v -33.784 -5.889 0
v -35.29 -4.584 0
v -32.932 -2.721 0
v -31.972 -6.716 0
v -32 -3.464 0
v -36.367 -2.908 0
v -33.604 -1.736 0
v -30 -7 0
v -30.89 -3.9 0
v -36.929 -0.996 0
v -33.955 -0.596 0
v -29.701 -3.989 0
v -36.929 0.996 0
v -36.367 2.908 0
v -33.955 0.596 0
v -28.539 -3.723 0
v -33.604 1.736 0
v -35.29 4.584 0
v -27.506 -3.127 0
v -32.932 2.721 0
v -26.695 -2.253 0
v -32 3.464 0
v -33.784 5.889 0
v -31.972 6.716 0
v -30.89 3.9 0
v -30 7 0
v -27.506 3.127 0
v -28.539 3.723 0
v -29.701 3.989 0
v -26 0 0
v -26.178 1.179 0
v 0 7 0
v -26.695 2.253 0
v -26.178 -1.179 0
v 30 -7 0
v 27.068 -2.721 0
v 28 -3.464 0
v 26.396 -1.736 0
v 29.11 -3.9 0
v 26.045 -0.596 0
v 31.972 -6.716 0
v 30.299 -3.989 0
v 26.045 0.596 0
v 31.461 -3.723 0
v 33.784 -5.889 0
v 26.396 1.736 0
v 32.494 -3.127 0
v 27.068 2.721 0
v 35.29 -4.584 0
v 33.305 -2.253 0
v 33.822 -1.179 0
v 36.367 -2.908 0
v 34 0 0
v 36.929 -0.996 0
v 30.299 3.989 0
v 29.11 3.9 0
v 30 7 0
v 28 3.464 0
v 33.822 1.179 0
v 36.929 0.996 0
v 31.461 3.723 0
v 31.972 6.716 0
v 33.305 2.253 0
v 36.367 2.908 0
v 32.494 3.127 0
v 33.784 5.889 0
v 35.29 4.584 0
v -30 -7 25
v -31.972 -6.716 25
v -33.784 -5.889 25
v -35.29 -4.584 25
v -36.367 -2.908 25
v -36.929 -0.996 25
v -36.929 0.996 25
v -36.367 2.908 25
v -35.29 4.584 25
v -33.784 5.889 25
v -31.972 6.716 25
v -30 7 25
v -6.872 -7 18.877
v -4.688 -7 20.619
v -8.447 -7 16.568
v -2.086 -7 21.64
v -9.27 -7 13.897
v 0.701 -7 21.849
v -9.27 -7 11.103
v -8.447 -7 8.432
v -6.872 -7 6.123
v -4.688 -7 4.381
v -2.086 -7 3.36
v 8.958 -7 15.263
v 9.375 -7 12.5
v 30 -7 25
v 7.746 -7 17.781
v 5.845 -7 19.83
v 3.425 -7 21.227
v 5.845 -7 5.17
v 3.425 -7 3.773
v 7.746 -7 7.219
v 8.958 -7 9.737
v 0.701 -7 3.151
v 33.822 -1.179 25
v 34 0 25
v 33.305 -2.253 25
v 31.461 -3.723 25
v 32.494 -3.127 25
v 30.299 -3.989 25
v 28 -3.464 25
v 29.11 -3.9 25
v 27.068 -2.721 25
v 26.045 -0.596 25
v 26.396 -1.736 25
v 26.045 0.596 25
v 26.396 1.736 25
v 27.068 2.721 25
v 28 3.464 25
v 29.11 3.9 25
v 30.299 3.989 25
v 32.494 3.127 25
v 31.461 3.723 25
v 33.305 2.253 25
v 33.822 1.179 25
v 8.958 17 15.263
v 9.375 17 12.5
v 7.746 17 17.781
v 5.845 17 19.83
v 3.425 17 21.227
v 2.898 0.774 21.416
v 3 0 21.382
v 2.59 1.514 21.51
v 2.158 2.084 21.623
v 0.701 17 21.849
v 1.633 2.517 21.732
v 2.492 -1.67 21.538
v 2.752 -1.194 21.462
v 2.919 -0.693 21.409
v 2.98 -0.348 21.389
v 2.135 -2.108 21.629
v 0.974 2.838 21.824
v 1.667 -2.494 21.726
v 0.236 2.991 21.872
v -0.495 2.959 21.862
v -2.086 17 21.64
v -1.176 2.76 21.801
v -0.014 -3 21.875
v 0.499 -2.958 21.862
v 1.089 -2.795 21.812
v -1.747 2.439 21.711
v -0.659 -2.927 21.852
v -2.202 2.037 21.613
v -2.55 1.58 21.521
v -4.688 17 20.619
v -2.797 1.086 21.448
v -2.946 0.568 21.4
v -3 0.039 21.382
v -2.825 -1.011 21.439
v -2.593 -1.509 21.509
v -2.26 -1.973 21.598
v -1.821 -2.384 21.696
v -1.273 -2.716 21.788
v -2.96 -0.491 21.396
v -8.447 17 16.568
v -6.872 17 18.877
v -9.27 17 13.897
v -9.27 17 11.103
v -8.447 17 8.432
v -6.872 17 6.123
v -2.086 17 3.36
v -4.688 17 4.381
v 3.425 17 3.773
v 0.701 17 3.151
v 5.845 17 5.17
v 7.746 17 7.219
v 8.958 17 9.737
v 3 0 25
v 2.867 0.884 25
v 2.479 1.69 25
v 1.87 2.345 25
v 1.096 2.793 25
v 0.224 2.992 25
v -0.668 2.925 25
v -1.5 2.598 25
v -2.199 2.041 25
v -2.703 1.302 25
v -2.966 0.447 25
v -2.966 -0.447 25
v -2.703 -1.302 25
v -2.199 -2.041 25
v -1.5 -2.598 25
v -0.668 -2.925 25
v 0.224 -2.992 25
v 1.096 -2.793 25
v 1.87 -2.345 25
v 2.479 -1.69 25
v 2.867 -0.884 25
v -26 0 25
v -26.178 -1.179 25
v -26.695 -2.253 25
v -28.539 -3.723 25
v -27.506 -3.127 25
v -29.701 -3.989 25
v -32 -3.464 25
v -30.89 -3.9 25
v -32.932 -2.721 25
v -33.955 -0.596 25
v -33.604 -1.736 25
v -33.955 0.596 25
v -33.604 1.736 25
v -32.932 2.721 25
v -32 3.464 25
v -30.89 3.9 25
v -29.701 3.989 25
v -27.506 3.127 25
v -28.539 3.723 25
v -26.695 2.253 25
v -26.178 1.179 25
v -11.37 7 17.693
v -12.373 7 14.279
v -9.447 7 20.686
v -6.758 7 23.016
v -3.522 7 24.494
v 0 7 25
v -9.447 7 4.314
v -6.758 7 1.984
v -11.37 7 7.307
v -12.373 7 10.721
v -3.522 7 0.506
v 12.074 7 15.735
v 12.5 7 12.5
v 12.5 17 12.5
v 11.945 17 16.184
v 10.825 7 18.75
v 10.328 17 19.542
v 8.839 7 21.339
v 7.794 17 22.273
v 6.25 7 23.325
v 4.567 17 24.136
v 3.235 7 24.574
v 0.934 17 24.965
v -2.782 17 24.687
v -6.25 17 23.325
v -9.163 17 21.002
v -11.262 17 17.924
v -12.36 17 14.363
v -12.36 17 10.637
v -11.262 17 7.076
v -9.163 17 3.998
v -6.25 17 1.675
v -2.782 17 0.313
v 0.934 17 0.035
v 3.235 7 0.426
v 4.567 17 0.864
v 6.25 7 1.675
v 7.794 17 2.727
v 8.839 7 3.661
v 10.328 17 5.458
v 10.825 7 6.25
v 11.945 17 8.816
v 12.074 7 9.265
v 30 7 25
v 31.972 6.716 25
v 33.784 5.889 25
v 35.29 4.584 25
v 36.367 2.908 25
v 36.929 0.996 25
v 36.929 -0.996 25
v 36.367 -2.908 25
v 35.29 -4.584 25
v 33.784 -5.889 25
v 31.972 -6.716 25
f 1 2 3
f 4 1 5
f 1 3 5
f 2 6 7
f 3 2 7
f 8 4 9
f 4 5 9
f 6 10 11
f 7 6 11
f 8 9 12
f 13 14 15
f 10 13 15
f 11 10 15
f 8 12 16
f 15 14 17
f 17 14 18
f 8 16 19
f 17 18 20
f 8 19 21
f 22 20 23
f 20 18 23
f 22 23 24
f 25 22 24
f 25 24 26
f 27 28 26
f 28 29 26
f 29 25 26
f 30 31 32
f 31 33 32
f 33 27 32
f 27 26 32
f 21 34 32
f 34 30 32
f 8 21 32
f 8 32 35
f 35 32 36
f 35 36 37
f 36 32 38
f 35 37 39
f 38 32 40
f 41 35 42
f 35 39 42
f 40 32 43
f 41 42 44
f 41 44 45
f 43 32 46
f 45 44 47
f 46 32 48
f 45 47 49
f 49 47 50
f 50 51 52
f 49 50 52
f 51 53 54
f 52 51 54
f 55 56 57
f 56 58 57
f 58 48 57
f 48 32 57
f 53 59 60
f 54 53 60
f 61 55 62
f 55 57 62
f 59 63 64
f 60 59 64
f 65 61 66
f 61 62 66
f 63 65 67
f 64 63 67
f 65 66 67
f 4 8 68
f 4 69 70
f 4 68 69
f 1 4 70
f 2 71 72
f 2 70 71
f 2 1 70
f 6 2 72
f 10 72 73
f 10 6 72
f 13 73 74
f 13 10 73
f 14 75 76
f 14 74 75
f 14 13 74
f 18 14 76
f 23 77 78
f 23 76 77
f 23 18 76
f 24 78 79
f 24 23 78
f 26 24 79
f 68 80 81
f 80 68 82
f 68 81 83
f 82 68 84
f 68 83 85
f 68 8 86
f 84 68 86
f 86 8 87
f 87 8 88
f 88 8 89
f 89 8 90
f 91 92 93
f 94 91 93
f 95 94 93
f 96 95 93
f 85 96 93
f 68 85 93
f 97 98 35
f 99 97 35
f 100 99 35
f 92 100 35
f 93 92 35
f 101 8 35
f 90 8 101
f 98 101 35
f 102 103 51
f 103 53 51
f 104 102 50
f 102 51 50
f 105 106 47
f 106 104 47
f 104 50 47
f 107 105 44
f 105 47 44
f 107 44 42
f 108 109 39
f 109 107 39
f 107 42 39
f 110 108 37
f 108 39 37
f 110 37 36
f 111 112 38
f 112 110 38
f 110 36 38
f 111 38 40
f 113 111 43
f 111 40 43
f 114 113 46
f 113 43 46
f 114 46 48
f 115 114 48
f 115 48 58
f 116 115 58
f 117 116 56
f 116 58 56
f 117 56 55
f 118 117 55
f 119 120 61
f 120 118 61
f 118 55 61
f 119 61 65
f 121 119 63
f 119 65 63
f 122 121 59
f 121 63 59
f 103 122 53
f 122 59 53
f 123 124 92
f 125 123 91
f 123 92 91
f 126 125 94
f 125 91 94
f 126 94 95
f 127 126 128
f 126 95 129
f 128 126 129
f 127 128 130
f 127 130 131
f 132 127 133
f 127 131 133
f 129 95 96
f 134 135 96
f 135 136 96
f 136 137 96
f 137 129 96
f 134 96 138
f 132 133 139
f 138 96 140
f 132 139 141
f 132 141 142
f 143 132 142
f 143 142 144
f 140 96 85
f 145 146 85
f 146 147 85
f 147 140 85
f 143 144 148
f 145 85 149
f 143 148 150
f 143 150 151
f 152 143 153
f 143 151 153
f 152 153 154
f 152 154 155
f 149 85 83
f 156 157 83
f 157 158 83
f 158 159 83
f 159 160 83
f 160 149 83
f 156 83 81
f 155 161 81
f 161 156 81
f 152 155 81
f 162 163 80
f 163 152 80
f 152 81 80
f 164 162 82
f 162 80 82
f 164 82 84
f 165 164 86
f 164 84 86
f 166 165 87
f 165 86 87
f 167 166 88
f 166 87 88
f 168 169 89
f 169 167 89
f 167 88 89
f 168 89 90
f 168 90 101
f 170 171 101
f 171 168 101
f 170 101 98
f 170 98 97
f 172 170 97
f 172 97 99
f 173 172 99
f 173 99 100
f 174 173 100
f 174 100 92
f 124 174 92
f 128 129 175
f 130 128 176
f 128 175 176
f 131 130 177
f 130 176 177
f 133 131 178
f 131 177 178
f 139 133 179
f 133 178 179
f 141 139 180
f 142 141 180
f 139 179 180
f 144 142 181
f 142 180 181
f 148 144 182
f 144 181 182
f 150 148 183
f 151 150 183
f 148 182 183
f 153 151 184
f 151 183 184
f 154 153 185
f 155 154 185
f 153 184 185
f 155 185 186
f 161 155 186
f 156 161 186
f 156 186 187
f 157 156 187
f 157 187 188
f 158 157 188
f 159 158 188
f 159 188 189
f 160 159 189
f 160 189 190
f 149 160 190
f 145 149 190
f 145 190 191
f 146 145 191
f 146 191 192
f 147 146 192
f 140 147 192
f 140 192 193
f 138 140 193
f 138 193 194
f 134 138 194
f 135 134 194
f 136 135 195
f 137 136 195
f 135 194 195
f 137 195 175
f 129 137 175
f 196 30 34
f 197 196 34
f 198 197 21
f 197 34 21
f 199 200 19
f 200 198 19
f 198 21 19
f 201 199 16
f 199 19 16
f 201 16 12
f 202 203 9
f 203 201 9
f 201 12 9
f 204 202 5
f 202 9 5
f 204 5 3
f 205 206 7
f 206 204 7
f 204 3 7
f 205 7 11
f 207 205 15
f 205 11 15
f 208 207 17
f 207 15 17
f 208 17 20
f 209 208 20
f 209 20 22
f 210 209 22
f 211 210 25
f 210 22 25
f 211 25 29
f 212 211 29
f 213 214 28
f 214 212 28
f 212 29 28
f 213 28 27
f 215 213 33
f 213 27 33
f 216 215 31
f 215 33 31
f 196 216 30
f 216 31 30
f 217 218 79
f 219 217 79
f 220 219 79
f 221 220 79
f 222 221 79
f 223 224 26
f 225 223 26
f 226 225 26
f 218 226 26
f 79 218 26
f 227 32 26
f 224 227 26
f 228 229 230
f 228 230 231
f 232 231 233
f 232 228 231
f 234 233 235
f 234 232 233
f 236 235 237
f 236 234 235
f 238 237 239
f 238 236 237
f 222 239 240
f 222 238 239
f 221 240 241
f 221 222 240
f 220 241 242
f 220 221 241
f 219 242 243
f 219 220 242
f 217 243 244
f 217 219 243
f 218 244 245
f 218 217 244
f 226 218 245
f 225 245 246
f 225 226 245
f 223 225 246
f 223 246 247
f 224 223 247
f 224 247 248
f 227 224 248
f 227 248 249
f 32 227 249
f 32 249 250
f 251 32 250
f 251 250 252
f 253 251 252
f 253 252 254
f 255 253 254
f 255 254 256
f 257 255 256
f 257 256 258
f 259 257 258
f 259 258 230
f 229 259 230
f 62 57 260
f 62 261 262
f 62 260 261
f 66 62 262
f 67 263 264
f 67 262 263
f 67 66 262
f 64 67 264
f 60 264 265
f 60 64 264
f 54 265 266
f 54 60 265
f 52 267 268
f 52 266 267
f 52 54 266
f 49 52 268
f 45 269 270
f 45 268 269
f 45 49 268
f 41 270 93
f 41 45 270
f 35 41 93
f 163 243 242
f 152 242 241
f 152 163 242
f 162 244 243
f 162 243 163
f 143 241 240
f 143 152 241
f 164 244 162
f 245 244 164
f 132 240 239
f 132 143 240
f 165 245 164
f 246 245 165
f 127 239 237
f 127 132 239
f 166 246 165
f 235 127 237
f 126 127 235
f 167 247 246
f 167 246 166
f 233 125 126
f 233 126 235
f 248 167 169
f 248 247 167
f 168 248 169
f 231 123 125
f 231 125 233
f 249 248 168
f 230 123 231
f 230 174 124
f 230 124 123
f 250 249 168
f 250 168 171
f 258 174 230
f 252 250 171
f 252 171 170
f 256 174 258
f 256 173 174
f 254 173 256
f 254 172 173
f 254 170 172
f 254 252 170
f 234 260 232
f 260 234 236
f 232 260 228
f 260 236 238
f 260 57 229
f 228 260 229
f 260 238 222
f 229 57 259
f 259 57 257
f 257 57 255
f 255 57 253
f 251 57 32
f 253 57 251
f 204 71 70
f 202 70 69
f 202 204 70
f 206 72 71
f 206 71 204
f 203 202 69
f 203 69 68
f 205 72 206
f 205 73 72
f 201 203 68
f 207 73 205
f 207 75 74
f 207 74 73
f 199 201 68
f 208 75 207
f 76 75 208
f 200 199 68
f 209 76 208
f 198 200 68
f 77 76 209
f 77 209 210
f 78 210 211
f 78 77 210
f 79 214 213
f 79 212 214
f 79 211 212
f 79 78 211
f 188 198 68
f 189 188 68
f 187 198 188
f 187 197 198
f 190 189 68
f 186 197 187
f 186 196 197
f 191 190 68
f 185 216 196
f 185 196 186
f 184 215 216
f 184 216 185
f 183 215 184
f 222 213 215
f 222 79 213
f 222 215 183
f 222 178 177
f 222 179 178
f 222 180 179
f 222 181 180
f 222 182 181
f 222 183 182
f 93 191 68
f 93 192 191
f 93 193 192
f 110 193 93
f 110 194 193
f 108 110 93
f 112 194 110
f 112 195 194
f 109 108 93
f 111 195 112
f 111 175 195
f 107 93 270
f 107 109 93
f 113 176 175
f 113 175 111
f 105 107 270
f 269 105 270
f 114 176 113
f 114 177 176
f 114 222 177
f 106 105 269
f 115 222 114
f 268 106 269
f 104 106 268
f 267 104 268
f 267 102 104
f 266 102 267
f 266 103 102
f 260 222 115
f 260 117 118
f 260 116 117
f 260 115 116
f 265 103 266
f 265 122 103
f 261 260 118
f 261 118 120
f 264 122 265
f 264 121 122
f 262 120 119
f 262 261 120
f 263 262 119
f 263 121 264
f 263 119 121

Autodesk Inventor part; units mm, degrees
ref_plane "YZ Plane" through (0, 0, 0) normal (1, 0, 0) x (0, 1, 0)
ref_plane "XZ Plane" through (0, 0, 0) normal (0, 1, 0) x (-1, 0, 0)
ref_plane "XY Plane" through (0, 0, 0) normal (0, 0, 1) x (1, 0, 0)
sketch "Sketch1" plane through (0, 0, 0) normal (0, 0, 1) x (1, 0, 0)
  line L0 (-30, 0) -> (30, 0) construction
  circle A0 centre (-30, 0) radius 4
  circle A1 centre (30, 0) radius 4
  line L1 (-30, 0) -> (30, 0) construction
  line L2 (-30, -7) -> (30, -7)
  line L3 (30, 7) -> (-30, 7)
  arc A2 (-30, 7) -> (-30, -7) centre (-30, 0) ccw
  arc A3 (30, -7) -> (30, 7) centre (30, 0) ccw
  point P0 (0, 0)
  point P1 (0, 0)
  point P2 (0, 0)
  dimension "d0" = 60
  dimension "d1" = 8
  dimension "d2" = 7
extrude "Extrusion1" add sketch "Sketch1" along normal blind 25
sketch "Sketch2" plane through (-30, -7, 0) normal (0, -1, 0) x (1, 0, 0)
  line L0 (0, 0) -> (60, 0) construction
  line L1 (60, 0) -> (60, 25) construction
  line L2 (0, 25) -> (60, 25) construction
  line L3 (0, 0) -> (0, 25) construction
  line L4 (30, 25) -> (30, 0) construction
  circle A0 centre (30, 12.5) radius 9.375
  dimension "d5" = 18.75
extrude "Extrusion2" cut sketch "Sketch2" against normal through all
sketch "Sketch3" plane through (-30, 7, 0) normal (0, 1, 0) x (1, 0, 0)
  circle A0 centre (30, -12.5) radius 9.375 projected
  circle A1 centre (30, -12.5) radius 12.5
  line L0 (60, -25) -> (0, -25) projected
  point P0 (30, 0)
extrude "Extrusion3" add sketch "Sketch3" along normal blind 10
sketch "Sketch4" plane through (0, 0, 25) normal (0, 0, 1) x (1, 0, 0)
  circle A0 centre (0, 0) radius 3
  dimension "d10" = 6
extrude "Extrusion4" cut sketch "Sketch4" against normal up to next
properties part number "reed switch holder"
